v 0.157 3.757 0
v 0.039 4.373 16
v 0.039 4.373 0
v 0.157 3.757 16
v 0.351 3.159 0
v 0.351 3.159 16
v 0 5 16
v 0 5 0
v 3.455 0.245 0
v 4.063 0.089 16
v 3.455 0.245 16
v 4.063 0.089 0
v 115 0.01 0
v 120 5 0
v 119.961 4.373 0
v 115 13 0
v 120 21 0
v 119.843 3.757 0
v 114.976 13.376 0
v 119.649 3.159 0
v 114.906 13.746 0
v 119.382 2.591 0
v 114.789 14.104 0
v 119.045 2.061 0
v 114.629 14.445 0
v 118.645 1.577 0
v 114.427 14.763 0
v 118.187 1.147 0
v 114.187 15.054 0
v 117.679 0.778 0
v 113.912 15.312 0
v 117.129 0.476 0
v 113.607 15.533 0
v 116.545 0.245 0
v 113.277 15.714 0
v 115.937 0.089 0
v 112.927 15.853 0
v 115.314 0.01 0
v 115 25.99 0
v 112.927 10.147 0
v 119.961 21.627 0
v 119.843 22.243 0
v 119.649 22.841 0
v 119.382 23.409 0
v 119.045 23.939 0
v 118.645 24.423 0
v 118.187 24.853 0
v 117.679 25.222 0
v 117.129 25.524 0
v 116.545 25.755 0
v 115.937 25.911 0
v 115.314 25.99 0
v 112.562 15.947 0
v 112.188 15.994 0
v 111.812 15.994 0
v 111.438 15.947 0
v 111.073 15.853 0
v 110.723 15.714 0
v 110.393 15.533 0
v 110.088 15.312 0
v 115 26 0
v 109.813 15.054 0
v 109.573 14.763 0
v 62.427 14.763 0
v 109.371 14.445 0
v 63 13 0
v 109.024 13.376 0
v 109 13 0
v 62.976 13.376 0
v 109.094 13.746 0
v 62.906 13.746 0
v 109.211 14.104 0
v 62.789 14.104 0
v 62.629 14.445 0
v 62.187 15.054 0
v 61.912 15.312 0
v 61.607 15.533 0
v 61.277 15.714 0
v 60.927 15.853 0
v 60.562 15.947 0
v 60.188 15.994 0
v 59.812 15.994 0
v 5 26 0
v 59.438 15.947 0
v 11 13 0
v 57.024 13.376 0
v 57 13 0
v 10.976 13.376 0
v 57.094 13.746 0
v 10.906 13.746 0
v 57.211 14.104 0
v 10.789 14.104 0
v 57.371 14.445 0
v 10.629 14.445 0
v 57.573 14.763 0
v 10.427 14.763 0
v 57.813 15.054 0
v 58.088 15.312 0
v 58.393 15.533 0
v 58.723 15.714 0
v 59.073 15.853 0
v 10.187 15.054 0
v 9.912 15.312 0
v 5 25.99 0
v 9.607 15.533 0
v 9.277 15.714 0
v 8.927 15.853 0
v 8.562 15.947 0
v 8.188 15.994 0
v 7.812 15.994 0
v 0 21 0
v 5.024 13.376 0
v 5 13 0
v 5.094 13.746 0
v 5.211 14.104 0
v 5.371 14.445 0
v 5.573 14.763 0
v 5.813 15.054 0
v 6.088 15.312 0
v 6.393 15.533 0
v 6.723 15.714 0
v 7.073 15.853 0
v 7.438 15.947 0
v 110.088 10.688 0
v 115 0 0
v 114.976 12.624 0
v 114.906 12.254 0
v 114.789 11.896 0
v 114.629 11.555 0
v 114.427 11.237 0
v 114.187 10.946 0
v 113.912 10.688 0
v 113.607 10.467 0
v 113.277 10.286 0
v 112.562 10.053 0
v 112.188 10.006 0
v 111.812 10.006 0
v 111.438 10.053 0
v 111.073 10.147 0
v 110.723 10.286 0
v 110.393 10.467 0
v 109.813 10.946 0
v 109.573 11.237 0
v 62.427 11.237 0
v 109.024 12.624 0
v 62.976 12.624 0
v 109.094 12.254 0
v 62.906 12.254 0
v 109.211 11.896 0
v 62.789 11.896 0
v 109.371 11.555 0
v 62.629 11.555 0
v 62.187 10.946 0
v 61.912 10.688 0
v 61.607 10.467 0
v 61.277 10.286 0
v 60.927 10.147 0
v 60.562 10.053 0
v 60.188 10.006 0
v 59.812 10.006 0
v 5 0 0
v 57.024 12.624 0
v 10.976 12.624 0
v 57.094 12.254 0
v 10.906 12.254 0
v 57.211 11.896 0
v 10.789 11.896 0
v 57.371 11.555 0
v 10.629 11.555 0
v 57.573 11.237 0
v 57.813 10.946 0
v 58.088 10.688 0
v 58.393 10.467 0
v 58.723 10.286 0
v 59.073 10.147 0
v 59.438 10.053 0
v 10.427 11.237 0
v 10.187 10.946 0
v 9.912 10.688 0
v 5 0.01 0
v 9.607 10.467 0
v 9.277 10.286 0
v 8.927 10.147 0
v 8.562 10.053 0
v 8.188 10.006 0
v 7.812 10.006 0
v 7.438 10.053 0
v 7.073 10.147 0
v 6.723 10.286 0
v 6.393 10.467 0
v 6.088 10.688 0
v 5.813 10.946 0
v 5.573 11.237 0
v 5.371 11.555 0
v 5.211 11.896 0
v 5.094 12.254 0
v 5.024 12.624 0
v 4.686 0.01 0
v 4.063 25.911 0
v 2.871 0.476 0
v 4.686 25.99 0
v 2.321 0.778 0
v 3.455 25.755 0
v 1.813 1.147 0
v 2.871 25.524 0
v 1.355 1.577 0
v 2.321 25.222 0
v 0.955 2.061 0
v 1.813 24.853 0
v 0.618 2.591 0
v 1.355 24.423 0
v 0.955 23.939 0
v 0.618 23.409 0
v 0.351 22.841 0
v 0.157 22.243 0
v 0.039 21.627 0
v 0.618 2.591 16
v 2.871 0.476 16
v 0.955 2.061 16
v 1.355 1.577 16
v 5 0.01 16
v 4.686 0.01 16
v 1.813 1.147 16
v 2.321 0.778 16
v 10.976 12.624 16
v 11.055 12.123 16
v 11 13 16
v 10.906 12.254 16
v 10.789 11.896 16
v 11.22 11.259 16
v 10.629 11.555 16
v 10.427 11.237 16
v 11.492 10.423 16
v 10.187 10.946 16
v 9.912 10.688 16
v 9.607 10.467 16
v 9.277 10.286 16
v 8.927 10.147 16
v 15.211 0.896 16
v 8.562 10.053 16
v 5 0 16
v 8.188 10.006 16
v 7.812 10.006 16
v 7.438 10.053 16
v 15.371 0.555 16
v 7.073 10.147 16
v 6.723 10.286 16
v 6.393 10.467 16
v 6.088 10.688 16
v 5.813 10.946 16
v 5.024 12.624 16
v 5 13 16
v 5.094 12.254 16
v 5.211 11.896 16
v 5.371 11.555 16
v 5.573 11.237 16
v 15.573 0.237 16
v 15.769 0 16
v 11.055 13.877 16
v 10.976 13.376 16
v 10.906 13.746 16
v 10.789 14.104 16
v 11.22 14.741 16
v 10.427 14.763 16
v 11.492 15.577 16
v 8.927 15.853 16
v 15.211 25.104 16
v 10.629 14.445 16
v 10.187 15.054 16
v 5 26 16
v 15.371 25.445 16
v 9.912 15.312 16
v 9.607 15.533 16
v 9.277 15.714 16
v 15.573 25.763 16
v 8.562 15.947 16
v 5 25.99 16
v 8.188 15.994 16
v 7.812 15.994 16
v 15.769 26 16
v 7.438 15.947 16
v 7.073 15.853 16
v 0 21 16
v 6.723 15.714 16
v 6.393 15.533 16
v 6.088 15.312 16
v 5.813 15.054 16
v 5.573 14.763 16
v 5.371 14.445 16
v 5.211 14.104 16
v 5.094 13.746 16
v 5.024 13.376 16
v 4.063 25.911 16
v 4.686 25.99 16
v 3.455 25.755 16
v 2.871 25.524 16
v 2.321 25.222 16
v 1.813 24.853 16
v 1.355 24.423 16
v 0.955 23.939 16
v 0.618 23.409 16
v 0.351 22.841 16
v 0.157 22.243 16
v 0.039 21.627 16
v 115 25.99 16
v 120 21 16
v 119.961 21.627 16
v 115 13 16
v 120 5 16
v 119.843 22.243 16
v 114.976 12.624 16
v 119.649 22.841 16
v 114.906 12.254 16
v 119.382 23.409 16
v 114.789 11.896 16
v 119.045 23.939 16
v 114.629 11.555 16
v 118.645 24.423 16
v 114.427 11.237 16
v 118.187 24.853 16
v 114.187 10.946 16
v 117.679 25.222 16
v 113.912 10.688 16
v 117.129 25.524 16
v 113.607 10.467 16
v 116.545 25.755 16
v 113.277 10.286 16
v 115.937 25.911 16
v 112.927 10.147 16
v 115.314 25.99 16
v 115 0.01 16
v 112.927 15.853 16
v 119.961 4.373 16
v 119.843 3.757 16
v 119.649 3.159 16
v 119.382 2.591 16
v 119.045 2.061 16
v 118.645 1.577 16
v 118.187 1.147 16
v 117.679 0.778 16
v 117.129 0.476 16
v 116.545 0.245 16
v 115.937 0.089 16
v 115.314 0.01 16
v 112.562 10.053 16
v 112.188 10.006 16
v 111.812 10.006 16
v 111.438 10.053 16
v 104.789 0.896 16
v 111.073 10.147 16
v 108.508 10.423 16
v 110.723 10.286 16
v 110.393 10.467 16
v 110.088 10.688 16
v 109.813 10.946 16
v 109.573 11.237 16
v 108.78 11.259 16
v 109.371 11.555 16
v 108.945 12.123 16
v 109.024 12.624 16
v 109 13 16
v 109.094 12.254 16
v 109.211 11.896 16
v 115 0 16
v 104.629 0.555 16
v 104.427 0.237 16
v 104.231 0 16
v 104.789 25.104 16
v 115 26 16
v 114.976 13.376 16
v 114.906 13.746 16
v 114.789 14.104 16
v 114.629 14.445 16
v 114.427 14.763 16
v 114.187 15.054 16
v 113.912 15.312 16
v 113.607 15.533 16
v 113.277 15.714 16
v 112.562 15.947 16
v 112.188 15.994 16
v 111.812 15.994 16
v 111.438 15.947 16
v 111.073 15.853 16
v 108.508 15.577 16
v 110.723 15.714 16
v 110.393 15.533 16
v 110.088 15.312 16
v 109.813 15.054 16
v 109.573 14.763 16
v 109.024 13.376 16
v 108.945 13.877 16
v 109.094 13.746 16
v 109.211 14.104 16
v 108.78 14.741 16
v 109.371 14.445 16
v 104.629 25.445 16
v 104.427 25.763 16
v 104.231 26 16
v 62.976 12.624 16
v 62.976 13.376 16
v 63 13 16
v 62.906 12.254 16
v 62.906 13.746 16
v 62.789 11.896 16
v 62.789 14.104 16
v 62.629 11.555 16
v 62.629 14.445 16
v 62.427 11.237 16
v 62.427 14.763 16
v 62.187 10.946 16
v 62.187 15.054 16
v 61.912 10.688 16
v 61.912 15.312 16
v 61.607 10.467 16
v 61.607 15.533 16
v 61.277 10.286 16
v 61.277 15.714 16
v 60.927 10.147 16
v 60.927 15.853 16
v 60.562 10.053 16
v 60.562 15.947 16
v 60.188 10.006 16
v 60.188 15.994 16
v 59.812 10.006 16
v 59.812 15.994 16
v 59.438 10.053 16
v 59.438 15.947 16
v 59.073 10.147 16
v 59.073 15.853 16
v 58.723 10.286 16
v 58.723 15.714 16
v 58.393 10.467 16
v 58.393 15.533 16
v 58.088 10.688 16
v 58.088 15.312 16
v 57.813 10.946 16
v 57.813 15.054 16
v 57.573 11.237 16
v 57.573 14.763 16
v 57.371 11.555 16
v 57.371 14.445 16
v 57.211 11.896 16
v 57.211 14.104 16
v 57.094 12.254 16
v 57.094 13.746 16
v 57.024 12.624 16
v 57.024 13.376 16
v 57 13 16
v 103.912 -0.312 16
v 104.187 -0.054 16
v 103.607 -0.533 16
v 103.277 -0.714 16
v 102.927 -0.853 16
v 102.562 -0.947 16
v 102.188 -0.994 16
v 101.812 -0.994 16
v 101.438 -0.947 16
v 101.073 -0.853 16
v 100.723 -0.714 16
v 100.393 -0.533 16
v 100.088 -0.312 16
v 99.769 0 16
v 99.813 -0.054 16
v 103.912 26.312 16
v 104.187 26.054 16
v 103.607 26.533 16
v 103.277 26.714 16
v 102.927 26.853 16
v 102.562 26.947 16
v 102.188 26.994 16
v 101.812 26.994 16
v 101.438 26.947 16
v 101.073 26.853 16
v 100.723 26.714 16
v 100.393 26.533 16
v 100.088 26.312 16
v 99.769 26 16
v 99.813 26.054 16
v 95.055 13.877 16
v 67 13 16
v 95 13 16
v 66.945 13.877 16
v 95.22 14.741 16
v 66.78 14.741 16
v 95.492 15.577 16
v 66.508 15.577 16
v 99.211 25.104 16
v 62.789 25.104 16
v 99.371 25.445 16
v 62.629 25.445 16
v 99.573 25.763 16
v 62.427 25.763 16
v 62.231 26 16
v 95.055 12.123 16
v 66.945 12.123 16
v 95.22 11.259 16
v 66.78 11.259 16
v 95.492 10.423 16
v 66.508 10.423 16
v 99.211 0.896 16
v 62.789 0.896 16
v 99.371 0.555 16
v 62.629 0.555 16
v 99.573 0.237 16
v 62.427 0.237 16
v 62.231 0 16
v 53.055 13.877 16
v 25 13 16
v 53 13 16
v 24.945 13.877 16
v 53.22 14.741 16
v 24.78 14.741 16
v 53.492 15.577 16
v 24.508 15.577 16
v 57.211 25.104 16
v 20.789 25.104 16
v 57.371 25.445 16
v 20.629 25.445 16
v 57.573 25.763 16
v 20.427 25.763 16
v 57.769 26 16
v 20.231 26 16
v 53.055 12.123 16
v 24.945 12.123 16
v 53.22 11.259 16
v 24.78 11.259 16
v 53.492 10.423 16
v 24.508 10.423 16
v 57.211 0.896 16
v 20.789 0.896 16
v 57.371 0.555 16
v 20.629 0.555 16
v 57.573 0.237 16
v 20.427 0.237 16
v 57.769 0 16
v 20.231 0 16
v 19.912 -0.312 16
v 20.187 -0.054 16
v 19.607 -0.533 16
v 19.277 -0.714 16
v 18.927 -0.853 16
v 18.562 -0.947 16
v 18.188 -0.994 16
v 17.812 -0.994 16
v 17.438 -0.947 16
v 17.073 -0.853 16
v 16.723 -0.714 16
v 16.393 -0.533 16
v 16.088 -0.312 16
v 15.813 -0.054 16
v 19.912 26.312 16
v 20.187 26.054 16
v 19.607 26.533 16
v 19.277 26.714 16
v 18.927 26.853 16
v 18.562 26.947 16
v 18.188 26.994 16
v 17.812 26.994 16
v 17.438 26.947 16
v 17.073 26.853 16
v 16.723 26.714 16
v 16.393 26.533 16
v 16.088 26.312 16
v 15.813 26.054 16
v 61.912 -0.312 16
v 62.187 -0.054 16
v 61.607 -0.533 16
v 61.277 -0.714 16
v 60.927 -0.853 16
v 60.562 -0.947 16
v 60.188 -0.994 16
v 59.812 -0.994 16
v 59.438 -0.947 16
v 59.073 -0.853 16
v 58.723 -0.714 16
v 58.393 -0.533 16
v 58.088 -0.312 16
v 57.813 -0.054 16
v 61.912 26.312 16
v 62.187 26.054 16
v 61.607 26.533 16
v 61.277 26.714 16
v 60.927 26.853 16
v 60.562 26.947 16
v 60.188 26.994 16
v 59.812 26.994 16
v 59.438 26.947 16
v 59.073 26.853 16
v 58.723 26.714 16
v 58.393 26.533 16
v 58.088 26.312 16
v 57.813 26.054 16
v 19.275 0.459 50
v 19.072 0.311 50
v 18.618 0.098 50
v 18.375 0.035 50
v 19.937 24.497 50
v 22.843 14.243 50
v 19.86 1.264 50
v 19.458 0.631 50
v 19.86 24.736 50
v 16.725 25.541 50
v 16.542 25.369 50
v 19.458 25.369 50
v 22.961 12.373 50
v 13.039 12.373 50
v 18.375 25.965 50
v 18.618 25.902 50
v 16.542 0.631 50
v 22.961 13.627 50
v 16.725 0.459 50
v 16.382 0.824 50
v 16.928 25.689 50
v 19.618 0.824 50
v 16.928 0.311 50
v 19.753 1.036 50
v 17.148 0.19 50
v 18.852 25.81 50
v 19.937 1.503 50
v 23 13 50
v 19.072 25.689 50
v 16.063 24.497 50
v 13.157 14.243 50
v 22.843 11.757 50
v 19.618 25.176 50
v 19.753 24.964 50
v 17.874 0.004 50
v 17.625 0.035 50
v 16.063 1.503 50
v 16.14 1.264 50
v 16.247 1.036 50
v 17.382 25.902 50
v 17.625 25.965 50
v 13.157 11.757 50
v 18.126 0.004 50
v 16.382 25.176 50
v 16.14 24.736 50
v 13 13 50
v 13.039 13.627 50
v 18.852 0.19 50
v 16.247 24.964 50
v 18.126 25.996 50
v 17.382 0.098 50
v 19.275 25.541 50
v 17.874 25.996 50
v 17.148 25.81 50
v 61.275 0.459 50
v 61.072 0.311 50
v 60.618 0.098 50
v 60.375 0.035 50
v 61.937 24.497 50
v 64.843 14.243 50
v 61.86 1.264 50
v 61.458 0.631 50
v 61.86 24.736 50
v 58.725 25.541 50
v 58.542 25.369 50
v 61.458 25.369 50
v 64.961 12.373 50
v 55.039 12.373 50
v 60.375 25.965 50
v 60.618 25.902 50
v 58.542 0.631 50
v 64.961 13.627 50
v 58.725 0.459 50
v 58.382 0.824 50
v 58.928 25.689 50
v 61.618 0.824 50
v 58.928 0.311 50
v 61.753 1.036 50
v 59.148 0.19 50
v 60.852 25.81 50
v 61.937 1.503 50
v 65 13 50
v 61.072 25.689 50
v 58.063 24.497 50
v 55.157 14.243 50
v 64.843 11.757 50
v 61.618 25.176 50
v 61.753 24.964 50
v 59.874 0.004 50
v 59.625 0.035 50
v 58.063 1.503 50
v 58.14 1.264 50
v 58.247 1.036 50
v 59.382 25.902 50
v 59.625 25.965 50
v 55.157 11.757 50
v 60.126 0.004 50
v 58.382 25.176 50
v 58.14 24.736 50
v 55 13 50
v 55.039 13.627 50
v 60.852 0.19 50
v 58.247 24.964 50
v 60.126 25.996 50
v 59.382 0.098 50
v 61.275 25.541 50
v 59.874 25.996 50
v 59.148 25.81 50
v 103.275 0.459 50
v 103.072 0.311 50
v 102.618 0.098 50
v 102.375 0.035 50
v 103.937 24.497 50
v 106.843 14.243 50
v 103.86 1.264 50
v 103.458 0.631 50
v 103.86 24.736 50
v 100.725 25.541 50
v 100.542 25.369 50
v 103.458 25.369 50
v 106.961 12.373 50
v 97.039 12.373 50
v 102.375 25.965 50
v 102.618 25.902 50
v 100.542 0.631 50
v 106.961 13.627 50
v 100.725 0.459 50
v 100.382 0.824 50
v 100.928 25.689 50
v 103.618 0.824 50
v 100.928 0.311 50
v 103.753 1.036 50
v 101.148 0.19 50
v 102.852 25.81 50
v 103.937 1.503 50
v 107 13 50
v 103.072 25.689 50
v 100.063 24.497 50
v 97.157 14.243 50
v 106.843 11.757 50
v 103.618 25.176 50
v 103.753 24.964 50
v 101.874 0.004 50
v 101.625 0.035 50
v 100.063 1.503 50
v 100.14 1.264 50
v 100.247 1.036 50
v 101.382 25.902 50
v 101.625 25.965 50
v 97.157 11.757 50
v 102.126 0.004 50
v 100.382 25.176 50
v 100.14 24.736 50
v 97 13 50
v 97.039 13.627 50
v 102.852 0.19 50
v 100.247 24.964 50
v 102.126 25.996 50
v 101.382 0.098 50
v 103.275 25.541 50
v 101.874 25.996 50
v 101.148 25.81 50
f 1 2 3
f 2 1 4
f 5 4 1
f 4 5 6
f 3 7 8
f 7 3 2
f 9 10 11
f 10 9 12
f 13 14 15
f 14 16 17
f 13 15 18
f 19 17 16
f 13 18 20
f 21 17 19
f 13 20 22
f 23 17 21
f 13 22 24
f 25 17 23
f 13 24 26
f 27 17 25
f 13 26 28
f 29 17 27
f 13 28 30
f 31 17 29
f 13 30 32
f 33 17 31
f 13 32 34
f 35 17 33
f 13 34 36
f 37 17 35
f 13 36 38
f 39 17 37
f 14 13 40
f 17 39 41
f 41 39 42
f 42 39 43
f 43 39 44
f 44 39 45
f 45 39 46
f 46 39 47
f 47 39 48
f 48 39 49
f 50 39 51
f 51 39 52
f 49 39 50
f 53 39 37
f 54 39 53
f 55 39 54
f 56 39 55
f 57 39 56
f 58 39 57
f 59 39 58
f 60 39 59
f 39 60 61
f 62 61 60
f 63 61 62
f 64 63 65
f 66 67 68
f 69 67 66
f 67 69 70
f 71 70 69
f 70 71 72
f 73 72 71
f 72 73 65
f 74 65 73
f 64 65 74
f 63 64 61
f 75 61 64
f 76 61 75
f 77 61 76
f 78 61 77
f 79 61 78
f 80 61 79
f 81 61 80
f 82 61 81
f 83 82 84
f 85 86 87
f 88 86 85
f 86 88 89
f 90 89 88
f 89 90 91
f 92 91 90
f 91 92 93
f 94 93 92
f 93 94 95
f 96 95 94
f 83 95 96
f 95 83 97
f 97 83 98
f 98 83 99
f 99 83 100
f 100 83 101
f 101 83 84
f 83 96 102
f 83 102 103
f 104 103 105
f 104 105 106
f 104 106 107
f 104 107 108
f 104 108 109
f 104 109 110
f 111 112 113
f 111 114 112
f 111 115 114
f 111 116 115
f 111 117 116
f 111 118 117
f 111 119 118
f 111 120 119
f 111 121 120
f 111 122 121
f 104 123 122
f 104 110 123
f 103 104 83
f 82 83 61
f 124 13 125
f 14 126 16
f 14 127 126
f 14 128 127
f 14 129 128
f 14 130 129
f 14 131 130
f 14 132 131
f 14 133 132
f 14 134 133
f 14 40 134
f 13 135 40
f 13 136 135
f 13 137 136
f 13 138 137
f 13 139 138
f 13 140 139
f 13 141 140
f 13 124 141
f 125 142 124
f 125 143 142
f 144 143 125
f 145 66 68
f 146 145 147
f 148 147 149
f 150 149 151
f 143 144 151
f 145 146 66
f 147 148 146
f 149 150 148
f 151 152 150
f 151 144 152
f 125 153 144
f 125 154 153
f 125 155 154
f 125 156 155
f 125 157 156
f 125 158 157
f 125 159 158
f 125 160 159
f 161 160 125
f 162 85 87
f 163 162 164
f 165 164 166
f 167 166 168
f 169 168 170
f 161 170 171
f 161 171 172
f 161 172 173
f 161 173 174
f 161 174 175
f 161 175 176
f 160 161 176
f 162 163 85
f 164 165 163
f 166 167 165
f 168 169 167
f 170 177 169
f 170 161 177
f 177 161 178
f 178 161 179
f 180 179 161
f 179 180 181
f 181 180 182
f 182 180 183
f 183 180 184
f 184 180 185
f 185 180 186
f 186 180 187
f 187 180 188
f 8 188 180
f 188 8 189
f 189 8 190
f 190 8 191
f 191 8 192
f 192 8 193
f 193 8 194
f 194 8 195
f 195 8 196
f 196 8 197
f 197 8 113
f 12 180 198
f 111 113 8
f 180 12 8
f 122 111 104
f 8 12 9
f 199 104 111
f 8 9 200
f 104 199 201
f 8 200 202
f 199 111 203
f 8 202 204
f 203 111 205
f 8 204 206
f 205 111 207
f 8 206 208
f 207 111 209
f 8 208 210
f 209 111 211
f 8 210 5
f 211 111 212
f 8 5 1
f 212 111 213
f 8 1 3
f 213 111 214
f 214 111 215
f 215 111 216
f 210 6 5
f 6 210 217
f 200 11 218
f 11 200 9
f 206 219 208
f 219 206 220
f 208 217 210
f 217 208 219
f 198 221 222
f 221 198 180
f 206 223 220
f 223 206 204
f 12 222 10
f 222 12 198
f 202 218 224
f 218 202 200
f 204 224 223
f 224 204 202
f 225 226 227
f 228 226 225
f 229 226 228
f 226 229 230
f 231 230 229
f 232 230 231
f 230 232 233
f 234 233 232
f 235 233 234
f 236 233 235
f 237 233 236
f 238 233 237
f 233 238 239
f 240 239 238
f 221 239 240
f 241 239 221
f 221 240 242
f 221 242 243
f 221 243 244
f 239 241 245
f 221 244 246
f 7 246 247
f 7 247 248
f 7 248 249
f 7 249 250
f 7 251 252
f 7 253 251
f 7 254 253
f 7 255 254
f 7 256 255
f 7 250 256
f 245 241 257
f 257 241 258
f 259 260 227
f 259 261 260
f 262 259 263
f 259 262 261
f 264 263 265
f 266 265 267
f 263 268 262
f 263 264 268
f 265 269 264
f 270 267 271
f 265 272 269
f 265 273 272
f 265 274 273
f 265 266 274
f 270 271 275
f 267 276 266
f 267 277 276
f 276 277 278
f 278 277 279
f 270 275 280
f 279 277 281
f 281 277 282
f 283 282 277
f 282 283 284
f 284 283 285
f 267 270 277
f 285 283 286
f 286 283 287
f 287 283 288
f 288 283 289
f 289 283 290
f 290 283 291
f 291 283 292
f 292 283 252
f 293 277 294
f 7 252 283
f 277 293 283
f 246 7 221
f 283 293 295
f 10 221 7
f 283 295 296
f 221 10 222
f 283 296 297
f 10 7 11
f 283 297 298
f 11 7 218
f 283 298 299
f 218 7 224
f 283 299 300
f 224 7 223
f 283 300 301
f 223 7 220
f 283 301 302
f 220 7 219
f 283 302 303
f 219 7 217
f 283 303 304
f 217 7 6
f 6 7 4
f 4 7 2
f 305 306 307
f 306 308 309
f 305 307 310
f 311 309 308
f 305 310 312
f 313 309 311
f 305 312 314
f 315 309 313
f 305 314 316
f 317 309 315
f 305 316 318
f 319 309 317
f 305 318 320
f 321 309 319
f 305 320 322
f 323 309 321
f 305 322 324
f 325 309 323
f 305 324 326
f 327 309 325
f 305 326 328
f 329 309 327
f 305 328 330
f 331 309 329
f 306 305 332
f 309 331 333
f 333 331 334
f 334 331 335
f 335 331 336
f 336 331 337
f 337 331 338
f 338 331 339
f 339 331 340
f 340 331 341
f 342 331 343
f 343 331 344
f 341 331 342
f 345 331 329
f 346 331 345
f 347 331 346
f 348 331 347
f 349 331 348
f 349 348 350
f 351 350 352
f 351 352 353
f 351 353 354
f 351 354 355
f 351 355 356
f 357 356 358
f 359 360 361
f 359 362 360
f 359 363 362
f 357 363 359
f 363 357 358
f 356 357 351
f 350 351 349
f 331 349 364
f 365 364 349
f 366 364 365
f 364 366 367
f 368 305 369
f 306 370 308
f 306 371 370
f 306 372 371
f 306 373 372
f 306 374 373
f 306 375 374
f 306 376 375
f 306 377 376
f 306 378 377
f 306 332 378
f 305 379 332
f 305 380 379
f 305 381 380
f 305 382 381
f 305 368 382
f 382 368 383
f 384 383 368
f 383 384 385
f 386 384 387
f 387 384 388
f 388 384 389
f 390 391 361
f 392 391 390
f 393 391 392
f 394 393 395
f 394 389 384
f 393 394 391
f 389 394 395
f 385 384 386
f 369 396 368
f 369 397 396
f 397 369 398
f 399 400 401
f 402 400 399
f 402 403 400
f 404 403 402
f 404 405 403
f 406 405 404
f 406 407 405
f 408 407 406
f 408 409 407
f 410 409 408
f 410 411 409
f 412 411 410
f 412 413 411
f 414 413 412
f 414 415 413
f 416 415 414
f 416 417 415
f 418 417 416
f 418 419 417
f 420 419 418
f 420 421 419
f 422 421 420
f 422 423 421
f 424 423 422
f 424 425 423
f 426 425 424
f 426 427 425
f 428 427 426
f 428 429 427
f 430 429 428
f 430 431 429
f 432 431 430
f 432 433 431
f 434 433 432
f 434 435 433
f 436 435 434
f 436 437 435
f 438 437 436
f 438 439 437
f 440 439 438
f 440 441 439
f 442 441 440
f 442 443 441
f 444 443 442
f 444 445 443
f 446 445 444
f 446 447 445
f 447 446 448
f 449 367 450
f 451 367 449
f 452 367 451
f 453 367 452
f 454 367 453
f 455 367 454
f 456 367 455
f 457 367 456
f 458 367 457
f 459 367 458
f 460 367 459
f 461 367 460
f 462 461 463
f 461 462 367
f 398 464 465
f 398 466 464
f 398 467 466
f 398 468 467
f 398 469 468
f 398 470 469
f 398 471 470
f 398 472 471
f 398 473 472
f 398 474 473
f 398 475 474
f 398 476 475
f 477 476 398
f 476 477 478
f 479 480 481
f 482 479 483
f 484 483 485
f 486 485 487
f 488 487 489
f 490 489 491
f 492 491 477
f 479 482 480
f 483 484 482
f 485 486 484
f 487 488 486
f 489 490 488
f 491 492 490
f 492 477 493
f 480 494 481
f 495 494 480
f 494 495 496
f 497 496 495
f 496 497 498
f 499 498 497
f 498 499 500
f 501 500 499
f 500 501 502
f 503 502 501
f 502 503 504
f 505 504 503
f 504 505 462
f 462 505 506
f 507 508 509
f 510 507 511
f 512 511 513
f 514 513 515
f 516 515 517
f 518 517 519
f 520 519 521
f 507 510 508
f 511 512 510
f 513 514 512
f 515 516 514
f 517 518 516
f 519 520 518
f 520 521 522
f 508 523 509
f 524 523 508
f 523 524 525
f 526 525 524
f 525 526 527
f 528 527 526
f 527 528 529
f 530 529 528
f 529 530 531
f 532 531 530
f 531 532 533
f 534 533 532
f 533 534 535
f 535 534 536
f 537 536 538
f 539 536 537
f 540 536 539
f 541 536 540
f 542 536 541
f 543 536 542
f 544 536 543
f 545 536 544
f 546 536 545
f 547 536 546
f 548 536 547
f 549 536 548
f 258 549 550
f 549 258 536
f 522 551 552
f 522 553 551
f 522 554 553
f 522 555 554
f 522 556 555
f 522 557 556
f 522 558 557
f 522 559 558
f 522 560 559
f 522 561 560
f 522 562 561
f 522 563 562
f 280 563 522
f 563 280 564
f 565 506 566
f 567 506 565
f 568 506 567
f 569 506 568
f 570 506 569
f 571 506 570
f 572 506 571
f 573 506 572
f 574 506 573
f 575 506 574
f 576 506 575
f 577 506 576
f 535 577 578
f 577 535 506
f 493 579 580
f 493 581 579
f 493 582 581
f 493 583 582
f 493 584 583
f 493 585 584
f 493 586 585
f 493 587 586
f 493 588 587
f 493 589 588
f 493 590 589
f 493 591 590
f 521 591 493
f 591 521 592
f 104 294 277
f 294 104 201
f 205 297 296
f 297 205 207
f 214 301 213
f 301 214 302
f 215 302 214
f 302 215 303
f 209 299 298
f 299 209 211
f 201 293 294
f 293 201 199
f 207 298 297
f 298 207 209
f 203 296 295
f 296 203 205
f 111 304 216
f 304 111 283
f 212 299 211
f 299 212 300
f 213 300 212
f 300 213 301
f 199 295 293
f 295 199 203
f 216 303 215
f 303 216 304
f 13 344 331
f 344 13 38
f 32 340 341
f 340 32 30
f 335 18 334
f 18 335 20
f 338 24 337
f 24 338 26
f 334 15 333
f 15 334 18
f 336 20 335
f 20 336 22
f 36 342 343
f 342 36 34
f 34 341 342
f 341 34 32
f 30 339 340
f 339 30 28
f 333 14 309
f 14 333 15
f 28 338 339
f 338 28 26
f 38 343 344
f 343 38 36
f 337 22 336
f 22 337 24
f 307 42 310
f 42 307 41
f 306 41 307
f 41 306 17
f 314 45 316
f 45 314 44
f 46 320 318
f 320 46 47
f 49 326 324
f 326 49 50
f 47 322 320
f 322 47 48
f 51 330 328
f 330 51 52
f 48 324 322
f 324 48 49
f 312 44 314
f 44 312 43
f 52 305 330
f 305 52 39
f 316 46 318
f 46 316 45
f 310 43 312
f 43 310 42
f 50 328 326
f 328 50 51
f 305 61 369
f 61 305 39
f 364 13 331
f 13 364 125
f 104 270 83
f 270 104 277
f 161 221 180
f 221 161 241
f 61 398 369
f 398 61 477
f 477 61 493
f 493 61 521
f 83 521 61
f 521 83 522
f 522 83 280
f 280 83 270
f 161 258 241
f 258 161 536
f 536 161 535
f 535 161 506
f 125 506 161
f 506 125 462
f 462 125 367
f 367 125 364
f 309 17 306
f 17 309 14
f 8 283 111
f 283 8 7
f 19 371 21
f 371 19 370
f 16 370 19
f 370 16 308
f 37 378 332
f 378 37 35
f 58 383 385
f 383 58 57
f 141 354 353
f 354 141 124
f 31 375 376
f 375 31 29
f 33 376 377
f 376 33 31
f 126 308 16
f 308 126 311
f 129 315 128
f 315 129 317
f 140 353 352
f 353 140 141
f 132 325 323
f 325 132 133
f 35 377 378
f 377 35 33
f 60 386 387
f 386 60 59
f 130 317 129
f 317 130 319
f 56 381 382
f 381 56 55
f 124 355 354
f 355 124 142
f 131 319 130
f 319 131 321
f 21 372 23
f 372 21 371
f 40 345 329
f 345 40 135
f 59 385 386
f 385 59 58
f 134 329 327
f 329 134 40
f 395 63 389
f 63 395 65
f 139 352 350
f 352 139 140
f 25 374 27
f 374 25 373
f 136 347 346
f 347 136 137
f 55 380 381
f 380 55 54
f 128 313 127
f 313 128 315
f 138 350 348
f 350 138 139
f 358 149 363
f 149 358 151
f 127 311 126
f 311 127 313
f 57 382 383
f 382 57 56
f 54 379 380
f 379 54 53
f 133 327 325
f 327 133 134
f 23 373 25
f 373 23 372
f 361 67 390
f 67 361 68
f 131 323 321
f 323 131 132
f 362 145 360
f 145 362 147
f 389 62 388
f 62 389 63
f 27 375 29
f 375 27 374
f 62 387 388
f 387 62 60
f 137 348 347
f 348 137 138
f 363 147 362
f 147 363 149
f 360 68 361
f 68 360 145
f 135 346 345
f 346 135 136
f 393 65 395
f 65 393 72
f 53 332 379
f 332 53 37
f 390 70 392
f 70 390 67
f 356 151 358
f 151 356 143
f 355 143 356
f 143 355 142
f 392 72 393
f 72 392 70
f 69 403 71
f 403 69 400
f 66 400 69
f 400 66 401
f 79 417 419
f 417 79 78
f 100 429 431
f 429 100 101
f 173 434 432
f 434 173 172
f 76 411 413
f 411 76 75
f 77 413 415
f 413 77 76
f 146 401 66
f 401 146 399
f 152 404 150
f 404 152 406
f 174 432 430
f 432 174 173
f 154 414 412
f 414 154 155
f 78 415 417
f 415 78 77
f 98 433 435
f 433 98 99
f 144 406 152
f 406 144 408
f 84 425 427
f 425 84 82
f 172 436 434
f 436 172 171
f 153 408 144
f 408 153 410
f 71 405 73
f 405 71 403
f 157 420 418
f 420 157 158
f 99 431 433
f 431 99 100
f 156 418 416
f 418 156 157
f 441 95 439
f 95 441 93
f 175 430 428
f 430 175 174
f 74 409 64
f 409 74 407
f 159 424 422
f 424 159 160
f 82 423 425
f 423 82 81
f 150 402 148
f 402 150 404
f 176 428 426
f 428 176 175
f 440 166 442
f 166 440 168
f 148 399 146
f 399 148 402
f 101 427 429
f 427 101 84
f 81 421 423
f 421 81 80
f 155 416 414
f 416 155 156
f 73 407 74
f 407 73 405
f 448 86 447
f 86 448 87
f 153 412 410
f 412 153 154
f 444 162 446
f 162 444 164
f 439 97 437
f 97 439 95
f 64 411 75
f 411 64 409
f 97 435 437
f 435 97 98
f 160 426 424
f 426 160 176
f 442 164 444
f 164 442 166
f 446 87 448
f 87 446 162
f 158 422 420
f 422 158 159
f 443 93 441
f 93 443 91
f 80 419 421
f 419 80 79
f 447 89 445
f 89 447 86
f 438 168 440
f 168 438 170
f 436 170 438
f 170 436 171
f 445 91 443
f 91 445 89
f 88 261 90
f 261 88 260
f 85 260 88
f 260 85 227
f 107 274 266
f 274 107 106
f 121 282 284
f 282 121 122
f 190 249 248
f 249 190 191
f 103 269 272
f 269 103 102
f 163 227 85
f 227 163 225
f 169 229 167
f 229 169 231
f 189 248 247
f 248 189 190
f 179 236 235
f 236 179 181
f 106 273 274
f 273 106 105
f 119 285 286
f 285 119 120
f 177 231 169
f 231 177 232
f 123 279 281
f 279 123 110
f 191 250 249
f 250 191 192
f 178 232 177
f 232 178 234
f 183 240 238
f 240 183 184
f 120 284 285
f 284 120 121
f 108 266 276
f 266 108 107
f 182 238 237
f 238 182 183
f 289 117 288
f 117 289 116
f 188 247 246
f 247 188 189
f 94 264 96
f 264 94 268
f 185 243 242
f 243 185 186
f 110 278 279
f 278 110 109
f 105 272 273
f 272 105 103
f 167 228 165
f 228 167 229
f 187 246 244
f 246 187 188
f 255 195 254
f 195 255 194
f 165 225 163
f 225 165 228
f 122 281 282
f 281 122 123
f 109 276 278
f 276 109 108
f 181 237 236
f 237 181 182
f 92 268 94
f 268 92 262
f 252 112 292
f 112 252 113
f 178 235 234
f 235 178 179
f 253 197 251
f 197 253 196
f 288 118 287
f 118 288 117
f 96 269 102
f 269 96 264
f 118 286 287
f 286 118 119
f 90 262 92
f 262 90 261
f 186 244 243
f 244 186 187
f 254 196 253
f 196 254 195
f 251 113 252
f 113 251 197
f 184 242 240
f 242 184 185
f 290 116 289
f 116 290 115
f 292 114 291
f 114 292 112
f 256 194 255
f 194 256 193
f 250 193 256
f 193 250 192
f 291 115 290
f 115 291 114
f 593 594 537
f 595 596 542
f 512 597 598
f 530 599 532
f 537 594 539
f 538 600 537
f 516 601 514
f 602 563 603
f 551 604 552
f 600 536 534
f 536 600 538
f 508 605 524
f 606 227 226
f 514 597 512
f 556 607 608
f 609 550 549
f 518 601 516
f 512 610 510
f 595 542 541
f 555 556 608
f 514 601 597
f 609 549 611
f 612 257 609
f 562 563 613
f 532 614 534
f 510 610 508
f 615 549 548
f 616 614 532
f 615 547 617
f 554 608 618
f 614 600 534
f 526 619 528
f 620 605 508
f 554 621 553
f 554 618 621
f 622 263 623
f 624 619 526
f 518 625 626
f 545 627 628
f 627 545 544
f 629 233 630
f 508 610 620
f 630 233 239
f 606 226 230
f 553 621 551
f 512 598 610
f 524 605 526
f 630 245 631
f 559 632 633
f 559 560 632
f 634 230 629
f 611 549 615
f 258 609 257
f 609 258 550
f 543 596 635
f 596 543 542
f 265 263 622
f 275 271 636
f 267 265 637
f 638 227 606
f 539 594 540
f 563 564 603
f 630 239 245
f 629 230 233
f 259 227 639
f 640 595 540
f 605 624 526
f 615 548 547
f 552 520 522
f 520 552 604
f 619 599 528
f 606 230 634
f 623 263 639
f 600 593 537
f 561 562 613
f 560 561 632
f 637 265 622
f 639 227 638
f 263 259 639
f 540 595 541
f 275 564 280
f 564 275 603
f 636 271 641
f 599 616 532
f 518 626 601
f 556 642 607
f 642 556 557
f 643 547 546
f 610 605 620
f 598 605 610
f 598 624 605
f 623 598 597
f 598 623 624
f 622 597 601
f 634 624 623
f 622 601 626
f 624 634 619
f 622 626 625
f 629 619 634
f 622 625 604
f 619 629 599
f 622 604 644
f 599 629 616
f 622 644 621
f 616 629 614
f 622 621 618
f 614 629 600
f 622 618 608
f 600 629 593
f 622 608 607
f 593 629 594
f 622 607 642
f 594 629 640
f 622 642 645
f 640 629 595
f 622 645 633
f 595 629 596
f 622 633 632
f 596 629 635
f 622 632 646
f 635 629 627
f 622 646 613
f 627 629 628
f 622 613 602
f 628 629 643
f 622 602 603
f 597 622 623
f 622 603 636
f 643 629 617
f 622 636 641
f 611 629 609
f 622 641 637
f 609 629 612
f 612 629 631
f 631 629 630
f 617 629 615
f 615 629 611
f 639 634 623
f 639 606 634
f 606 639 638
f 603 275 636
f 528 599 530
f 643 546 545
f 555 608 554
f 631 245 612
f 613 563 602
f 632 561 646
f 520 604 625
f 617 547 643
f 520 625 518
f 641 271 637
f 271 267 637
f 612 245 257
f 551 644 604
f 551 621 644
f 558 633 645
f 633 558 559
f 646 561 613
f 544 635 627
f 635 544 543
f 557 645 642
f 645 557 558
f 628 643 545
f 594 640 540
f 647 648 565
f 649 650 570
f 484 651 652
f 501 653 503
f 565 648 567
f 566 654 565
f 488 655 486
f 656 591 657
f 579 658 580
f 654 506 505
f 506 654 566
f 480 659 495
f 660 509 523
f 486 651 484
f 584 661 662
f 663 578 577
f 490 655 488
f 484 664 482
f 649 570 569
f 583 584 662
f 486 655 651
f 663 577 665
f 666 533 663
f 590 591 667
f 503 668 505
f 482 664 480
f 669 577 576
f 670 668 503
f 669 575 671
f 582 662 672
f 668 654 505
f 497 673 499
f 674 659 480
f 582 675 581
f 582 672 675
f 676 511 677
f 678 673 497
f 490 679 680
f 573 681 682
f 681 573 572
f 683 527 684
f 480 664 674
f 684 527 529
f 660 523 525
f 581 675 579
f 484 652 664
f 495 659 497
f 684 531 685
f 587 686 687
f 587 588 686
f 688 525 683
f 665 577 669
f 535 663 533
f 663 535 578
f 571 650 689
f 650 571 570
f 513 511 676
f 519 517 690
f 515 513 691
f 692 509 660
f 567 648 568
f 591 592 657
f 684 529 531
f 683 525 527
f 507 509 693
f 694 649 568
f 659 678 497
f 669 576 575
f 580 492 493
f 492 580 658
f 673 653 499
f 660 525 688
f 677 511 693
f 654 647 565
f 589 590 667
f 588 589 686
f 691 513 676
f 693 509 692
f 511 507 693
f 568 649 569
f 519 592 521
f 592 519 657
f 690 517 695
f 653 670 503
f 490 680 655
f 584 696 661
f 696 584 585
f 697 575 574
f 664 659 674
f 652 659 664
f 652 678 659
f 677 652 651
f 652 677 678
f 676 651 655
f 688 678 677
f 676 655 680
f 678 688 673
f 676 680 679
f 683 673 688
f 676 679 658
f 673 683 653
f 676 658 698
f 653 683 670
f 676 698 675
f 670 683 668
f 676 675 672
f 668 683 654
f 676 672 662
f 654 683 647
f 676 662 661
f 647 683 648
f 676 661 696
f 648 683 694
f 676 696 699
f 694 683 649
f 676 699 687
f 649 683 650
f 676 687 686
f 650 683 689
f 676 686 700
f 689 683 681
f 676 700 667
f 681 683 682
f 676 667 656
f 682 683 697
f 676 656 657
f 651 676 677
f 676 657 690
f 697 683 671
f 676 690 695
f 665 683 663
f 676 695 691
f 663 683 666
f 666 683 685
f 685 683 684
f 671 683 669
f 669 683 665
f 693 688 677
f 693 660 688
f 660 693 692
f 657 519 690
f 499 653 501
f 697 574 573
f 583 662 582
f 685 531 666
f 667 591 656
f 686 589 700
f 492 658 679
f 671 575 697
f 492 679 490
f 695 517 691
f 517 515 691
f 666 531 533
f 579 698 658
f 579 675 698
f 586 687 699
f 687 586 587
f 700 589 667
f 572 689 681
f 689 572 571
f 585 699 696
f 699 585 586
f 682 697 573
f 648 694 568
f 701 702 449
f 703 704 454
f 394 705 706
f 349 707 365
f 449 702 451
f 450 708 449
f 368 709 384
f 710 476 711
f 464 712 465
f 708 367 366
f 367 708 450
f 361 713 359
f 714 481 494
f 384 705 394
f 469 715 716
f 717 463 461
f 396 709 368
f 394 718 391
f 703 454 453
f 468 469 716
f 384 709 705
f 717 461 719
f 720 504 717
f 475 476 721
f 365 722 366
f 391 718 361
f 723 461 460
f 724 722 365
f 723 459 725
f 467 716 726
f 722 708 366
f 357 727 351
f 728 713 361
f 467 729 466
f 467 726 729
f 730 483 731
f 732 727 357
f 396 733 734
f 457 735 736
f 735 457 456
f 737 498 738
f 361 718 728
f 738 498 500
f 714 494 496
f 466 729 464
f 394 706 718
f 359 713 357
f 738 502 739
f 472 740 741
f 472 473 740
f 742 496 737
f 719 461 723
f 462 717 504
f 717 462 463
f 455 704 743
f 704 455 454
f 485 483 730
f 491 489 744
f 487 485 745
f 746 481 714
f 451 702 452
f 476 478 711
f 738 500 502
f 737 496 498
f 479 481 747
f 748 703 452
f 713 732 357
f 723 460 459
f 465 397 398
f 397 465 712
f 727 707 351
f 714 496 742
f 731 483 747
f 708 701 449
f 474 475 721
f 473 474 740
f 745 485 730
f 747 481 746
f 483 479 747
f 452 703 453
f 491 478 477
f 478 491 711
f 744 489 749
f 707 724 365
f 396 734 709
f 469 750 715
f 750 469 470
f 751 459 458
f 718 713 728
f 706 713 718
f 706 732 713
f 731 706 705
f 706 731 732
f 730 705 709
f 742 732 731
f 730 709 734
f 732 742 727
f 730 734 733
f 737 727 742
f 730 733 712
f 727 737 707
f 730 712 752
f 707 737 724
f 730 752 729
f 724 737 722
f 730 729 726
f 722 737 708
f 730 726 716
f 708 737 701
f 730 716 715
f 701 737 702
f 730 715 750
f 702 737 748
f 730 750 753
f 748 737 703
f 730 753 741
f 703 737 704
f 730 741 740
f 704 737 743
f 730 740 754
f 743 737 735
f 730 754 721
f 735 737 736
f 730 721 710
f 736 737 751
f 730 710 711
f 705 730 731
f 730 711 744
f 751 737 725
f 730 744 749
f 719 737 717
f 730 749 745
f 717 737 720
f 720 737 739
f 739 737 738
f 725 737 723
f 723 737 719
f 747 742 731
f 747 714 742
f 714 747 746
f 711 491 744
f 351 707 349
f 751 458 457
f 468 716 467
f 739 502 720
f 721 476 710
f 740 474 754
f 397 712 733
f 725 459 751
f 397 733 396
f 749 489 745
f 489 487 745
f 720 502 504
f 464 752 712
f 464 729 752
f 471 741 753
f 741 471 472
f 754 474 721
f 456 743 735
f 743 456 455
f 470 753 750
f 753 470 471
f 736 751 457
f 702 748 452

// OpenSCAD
/*

Bypass closet door floor guide
Author: Peter Loron <peterl@standingwave.org>
License: http://creativecommons.org/licenses/by-sa/3.0/

*/
include <./MCAD/boxes.scad>
$fn = 50;

module guide()
{
	union() {
		difference() {
			//baseplate
			translate([60,13,8]) roundedBox([120,26,16],5,true);

			//screw holes
			translate([112,13,-4]) cylinder(25,3,3);
			translate([60,13,-4]) cylinder(25,3,3);
			translate([8,13,-4]) cylinder(25,3,3);
		}

		//tongues
		translate([18,0,0]) tongue();
		translate([60,0,0]) tongue();
		translate([102,0,0]) tongue();
	}
}

module tongue() {
	hull() {
		translate([0,2,16]) cylinder(34,3,2);
		translate([0,13,16]) cylinder(34,7,5);
		translate([0,24,16]) cylinder(34,3,2);
	}
}

guide();
